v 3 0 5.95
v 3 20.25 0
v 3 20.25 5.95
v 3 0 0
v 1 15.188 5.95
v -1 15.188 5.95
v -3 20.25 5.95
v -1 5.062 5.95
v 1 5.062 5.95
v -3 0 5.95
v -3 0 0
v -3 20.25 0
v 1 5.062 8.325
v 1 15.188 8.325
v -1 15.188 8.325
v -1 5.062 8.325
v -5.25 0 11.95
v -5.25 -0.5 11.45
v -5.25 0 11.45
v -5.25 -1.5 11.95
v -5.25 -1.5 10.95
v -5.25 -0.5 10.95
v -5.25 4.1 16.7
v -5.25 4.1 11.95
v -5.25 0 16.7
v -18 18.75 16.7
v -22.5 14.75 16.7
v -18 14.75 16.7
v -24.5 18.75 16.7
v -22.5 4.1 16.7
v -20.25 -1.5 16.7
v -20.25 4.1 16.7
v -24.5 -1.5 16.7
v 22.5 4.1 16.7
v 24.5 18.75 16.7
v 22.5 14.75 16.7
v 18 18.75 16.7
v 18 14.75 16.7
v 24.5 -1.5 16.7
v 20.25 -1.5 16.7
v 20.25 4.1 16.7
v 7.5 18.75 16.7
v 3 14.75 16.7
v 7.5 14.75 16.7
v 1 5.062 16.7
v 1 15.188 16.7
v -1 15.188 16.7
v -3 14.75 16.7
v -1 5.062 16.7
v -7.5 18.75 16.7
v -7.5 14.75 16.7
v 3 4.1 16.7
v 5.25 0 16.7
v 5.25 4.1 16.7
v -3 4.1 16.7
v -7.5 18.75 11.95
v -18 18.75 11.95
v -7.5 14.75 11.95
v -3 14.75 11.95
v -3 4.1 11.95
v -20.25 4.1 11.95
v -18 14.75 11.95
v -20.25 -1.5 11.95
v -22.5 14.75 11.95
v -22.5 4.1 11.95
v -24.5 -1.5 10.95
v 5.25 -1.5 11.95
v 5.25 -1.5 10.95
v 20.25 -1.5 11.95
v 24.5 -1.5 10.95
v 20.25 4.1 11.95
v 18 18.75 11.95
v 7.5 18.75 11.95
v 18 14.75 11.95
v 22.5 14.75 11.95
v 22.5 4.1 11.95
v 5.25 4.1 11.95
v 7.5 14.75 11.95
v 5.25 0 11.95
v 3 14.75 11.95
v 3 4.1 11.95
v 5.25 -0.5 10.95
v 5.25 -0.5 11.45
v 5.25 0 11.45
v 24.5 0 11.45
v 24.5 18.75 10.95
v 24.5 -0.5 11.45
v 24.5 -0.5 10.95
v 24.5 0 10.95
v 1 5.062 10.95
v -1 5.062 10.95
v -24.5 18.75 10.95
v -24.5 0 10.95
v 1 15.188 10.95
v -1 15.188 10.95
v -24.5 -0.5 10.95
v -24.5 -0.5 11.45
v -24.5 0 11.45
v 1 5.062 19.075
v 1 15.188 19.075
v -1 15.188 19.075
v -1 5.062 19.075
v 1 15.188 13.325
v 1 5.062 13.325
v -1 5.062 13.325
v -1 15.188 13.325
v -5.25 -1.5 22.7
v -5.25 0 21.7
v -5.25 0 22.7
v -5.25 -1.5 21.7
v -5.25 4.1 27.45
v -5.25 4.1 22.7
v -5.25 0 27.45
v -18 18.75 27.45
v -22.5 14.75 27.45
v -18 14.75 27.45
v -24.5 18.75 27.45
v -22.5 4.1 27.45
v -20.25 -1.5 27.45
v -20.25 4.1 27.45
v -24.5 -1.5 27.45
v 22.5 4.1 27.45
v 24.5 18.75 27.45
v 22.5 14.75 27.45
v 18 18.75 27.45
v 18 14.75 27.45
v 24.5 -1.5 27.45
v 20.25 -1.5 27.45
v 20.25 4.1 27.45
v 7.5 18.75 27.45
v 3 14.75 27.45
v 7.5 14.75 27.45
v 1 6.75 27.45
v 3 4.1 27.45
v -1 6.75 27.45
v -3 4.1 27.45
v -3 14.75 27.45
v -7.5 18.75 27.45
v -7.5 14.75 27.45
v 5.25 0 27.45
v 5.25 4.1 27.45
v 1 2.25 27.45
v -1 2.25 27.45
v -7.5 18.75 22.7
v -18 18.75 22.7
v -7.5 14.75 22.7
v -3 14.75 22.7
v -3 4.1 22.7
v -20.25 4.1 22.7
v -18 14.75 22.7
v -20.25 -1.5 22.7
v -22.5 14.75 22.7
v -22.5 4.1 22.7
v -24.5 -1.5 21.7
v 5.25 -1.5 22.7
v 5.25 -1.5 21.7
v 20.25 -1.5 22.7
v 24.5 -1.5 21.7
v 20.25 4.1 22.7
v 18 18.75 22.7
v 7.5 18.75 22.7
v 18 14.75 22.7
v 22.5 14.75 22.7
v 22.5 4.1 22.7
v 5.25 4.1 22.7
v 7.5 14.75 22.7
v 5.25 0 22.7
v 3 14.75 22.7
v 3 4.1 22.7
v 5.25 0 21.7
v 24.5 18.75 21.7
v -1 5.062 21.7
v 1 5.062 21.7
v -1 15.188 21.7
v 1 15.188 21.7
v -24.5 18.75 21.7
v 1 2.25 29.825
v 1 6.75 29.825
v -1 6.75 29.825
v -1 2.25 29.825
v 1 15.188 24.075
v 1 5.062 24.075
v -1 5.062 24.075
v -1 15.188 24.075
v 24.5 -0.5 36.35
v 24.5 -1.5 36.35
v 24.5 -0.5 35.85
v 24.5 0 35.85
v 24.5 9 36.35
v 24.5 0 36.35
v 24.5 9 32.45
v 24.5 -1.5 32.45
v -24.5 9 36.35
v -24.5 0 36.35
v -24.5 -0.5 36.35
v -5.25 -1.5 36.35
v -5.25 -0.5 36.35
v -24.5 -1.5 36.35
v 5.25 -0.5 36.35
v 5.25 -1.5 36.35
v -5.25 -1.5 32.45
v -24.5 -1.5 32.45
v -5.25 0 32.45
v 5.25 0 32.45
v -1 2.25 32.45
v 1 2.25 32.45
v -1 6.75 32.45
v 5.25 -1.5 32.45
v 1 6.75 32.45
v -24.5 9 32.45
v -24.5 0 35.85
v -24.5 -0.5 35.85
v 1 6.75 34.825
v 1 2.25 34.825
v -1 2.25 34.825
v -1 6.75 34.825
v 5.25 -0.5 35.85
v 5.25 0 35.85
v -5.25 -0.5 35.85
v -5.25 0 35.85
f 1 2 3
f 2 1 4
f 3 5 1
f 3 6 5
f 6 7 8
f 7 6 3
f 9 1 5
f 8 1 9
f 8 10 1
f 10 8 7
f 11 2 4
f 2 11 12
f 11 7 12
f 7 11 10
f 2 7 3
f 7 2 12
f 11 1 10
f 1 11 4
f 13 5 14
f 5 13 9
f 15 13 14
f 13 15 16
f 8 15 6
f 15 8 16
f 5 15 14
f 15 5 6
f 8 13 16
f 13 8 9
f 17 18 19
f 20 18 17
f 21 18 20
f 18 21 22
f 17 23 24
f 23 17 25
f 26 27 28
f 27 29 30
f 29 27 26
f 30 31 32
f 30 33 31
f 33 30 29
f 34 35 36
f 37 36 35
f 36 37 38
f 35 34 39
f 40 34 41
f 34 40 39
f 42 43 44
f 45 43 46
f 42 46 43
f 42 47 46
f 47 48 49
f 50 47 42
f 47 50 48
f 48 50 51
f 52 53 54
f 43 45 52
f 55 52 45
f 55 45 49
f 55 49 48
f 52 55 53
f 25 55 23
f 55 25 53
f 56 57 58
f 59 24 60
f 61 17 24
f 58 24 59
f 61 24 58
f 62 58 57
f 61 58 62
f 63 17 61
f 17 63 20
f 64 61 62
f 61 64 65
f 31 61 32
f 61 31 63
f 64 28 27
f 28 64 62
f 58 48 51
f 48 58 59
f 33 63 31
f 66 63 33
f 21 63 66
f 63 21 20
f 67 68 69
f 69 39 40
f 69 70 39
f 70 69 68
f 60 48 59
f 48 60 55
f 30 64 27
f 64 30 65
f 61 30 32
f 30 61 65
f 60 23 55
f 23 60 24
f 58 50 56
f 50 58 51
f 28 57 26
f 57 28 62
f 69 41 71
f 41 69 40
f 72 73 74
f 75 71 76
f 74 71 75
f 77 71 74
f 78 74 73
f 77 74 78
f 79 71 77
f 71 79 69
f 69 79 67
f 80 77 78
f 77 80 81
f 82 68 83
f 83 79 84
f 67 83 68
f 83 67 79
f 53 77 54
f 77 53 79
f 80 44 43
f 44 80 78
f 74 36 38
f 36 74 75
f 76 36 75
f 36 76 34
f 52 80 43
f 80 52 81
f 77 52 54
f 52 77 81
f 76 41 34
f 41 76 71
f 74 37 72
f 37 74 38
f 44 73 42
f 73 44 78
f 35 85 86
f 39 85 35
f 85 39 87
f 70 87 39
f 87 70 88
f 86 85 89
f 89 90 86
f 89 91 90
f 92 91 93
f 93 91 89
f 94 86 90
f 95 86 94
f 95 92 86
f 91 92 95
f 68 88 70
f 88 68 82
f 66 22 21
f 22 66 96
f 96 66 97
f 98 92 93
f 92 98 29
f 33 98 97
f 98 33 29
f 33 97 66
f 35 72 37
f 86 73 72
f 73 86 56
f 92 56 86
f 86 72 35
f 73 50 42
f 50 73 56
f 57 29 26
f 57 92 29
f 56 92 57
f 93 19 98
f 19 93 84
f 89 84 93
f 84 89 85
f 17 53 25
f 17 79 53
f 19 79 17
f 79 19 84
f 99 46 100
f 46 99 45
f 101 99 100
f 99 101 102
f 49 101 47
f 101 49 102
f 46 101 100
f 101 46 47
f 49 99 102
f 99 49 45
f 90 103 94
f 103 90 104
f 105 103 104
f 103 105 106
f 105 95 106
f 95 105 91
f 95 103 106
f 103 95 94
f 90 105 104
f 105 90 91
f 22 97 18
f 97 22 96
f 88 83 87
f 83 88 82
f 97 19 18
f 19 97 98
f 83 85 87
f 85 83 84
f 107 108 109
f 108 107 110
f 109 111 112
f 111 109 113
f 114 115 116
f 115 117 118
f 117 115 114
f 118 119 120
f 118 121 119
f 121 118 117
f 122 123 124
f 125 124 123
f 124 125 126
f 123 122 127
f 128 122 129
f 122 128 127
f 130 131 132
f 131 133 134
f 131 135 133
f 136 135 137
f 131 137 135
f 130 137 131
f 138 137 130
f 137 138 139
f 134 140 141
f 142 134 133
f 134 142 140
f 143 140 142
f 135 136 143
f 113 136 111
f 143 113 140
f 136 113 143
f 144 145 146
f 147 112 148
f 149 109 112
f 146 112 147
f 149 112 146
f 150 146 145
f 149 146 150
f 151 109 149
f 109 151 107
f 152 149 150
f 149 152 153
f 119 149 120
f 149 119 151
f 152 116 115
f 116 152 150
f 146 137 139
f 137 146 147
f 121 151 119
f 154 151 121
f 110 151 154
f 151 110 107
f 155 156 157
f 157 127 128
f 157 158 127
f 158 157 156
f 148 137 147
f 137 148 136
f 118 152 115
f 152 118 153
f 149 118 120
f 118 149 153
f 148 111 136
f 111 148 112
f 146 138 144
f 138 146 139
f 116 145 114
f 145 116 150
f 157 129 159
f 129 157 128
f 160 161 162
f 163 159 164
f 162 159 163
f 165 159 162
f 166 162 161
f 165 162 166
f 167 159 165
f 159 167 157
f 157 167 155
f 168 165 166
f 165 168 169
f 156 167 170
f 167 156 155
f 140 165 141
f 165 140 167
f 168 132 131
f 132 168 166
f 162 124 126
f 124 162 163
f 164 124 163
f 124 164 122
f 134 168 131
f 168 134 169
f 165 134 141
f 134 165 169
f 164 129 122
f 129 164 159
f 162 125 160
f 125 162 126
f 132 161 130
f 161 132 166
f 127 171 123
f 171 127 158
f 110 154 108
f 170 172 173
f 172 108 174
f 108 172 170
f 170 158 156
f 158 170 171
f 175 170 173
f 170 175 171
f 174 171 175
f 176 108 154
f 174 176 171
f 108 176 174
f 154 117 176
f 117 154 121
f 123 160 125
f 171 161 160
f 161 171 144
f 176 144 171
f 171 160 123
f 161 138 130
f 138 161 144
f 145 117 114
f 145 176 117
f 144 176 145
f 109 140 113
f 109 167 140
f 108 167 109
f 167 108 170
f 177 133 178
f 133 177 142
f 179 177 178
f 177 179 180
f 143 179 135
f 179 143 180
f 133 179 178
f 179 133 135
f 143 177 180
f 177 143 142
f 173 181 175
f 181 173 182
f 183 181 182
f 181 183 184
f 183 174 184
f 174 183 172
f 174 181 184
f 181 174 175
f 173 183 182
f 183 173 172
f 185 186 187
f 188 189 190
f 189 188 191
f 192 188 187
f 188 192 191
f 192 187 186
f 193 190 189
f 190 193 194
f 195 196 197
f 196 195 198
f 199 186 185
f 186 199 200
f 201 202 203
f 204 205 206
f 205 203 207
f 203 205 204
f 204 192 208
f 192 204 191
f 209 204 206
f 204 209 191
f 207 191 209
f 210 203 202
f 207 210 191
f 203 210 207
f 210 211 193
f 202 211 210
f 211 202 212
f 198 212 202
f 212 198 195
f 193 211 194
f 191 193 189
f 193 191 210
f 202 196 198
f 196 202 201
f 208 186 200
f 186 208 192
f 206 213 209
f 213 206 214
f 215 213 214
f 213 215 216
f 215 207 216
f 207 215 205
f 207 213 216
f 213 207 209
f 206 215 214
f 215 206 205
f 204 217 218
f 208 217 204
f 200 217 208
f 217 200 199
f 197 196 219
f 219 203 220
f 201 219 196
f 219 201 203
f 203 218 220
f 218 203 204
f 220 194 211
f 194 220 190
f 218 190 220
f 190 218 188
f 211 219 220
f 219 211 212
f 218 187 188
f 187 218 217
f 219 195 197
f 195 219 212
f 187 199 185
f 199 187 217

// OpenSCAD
// 8th-gen NUC
// https://www.intel.com/content/dam/support/us/en/documents/mini-pcs/nuc-kits/NUC8i3BE_NUC8i5BE_NUC8i7BE_TechProdSpec.pdf
mobo_screw_distance = 90.4;
chassis_bolt_diameter = 5;
center_column_width = 10.5;
center_column_thickness = 0.5;
opening_width = 27.35;
opening_height = 14.45;
opening_offset_z = -3.4;
opening_to_bottom = 6.45;
interior_width = 106.5 -1;
sodimm_to_chassis = 9;

// HDMI jack boards
board_width = 33.6;
board_depth = 30;
board_height = 1.65;
plug_width = 15.2;
plug_depth = 11.5;
plug_height = 6.25;
plug_offset = 10.85;
screw_distance_x = 25;
screw_distance_y = 22;
screw_offset_x = 4.25;
screw_offset_y = 4;
screw_diameter = 3.3;

// DIY HDMI Cable Parts - Straight Micro HDMI Socket Adapter
// https://www.adafruit.com/product/3559
socket_width_1 = 15;
socket_narrow_length = 5.6;
socket_width_2 = 19.5;
socket_ribbon_width = 10.5;
socket_depth = 16.25;
socket_height = 4.75;

// Variables
mount_panel_thickness = 1;
socket_padding_x = 2;
socket_padding_y = 4;
mount_panel_width = center_column_width + socket_width_1 + socket_width_2 +
  socket_padding_x * 2;
mount_panel_depth = socket_depth + socket_padding_y;
footer_height = opening_to_bottom - mount_panel_thickness/2;
panel_height = mount_panel_thickness + socket_height;

module socket() {
  union() {
    // narrow end
    translate([-socket_width_1/2, 0, 0]) {
      cube([socket_width_1, socket_depth, socket_height]);
    }

    // wide end
    translate([-socket_width_2/2, socket_narrow_length, 0]) {
      cube([socket_width_2, socket_depth - socket_narrow_length, socket_height]);
    }

    // cable
    translate([-socket_ribbon_width/2, 0, 0]) {
      cube([socket_ribbon_width, socket_depth*2, socket_height]);
    }
  }
}

module peg() {
  translate([-socket_padding_x/2, mount_panel_depth/4, 0]) {
    cube([socket_padding_x, mount_panel_depth/2, socket_height/2]);
  }
}

module peg_2() {
  translate([-socket_padding_x/2, sodimm_to_chassis/4, 0]) {
    cube([socket_padding_x, sodimm_to_chassis/2, socket_height/2]);
  }
}

module center_column() {
  translate([0, -interior_width/2, 0]) {
    cube([center_column_width, interior_width, interior_width], center=true);
  }
}

module lip() {
  translate([-interior_width, 0, 0]) {
    rotate([180, 0, 0]) cube([interior_width*2, center_column_thickness, interior_width], center=false);
  }
}

module panel() {
  difference() {
    translate([0, -center_column_thickness*3, 0]) {
      difference() {
        union() {
          translate([-mount_panel_width/2, 0, 0]) {
            cube([mount_panel_width, mount_panel_depth, panel_height]);
          }
        }
        offset = center_column_width/2 + socket_width_1/2;
        for (x = [-offset, offset]) {
          translate([x, 0, mount_panel_thickness]) {
            socket();
          }
        }
      }
    }
    center_column();
  }
}

module footer() {
  width = socket_padding_x*3;
  translate([-width/2, 0, 0]) {
    cube([width, mount_panel_depth, footer_height]);
  }
  translate([0, 0, footer_height]) {
    peg();
  }
}

module panel_1() {
  difference() {
    union() {
      panel();
      translate([0, 0, panel_height]) {
        peg();
      }
    }
    peg();
    translate([0, 0, mount_panel_thickness/2]) {
      lip();
    }
  }
}

module panel_2() {
  difference() {
    union() {
      panel();
      translate([0, 0, panel_height]) {
        peg_2();
      }
    }
    peg();
  }
}

module topper() {
  difference() {
    translate([-mount_panel_width/2, -center_column_thickness*3, 0]) {
      cube([
        mount_panel_width,
        sodimm_to_chassis + center_column_thickness*3,
        -opening_offset_z + mount_panel_thickness/2,
      ]);
    }
    peg_2();
    center_column();
    translate([0, 0, -opening_offset_z]) {
      mirror([0, 0, 1]) lip();
    }
  }
}

// y=0 is the interior side of the chassis
// z=0 is the top of the SO-DIMM sockets
/*difference() {
  union() {
    translate([0, 0, opening_offset_z + mount_panel_thickness/2]) {
      mirror([0, 0, 1]) {
        panel_1();
      }
    }
  }
}*/



module arrange(spacing = 0) {
  footer();

  translate([0, 0, footer_height + spacing]) {
    panel_1();

    translate([0, 0, panel_height + spacing]) {
      panel_2();

      translate([0, 0, panel_height + spacing]) {
        topper();
      }
    }
  }
}

arrange(5);
